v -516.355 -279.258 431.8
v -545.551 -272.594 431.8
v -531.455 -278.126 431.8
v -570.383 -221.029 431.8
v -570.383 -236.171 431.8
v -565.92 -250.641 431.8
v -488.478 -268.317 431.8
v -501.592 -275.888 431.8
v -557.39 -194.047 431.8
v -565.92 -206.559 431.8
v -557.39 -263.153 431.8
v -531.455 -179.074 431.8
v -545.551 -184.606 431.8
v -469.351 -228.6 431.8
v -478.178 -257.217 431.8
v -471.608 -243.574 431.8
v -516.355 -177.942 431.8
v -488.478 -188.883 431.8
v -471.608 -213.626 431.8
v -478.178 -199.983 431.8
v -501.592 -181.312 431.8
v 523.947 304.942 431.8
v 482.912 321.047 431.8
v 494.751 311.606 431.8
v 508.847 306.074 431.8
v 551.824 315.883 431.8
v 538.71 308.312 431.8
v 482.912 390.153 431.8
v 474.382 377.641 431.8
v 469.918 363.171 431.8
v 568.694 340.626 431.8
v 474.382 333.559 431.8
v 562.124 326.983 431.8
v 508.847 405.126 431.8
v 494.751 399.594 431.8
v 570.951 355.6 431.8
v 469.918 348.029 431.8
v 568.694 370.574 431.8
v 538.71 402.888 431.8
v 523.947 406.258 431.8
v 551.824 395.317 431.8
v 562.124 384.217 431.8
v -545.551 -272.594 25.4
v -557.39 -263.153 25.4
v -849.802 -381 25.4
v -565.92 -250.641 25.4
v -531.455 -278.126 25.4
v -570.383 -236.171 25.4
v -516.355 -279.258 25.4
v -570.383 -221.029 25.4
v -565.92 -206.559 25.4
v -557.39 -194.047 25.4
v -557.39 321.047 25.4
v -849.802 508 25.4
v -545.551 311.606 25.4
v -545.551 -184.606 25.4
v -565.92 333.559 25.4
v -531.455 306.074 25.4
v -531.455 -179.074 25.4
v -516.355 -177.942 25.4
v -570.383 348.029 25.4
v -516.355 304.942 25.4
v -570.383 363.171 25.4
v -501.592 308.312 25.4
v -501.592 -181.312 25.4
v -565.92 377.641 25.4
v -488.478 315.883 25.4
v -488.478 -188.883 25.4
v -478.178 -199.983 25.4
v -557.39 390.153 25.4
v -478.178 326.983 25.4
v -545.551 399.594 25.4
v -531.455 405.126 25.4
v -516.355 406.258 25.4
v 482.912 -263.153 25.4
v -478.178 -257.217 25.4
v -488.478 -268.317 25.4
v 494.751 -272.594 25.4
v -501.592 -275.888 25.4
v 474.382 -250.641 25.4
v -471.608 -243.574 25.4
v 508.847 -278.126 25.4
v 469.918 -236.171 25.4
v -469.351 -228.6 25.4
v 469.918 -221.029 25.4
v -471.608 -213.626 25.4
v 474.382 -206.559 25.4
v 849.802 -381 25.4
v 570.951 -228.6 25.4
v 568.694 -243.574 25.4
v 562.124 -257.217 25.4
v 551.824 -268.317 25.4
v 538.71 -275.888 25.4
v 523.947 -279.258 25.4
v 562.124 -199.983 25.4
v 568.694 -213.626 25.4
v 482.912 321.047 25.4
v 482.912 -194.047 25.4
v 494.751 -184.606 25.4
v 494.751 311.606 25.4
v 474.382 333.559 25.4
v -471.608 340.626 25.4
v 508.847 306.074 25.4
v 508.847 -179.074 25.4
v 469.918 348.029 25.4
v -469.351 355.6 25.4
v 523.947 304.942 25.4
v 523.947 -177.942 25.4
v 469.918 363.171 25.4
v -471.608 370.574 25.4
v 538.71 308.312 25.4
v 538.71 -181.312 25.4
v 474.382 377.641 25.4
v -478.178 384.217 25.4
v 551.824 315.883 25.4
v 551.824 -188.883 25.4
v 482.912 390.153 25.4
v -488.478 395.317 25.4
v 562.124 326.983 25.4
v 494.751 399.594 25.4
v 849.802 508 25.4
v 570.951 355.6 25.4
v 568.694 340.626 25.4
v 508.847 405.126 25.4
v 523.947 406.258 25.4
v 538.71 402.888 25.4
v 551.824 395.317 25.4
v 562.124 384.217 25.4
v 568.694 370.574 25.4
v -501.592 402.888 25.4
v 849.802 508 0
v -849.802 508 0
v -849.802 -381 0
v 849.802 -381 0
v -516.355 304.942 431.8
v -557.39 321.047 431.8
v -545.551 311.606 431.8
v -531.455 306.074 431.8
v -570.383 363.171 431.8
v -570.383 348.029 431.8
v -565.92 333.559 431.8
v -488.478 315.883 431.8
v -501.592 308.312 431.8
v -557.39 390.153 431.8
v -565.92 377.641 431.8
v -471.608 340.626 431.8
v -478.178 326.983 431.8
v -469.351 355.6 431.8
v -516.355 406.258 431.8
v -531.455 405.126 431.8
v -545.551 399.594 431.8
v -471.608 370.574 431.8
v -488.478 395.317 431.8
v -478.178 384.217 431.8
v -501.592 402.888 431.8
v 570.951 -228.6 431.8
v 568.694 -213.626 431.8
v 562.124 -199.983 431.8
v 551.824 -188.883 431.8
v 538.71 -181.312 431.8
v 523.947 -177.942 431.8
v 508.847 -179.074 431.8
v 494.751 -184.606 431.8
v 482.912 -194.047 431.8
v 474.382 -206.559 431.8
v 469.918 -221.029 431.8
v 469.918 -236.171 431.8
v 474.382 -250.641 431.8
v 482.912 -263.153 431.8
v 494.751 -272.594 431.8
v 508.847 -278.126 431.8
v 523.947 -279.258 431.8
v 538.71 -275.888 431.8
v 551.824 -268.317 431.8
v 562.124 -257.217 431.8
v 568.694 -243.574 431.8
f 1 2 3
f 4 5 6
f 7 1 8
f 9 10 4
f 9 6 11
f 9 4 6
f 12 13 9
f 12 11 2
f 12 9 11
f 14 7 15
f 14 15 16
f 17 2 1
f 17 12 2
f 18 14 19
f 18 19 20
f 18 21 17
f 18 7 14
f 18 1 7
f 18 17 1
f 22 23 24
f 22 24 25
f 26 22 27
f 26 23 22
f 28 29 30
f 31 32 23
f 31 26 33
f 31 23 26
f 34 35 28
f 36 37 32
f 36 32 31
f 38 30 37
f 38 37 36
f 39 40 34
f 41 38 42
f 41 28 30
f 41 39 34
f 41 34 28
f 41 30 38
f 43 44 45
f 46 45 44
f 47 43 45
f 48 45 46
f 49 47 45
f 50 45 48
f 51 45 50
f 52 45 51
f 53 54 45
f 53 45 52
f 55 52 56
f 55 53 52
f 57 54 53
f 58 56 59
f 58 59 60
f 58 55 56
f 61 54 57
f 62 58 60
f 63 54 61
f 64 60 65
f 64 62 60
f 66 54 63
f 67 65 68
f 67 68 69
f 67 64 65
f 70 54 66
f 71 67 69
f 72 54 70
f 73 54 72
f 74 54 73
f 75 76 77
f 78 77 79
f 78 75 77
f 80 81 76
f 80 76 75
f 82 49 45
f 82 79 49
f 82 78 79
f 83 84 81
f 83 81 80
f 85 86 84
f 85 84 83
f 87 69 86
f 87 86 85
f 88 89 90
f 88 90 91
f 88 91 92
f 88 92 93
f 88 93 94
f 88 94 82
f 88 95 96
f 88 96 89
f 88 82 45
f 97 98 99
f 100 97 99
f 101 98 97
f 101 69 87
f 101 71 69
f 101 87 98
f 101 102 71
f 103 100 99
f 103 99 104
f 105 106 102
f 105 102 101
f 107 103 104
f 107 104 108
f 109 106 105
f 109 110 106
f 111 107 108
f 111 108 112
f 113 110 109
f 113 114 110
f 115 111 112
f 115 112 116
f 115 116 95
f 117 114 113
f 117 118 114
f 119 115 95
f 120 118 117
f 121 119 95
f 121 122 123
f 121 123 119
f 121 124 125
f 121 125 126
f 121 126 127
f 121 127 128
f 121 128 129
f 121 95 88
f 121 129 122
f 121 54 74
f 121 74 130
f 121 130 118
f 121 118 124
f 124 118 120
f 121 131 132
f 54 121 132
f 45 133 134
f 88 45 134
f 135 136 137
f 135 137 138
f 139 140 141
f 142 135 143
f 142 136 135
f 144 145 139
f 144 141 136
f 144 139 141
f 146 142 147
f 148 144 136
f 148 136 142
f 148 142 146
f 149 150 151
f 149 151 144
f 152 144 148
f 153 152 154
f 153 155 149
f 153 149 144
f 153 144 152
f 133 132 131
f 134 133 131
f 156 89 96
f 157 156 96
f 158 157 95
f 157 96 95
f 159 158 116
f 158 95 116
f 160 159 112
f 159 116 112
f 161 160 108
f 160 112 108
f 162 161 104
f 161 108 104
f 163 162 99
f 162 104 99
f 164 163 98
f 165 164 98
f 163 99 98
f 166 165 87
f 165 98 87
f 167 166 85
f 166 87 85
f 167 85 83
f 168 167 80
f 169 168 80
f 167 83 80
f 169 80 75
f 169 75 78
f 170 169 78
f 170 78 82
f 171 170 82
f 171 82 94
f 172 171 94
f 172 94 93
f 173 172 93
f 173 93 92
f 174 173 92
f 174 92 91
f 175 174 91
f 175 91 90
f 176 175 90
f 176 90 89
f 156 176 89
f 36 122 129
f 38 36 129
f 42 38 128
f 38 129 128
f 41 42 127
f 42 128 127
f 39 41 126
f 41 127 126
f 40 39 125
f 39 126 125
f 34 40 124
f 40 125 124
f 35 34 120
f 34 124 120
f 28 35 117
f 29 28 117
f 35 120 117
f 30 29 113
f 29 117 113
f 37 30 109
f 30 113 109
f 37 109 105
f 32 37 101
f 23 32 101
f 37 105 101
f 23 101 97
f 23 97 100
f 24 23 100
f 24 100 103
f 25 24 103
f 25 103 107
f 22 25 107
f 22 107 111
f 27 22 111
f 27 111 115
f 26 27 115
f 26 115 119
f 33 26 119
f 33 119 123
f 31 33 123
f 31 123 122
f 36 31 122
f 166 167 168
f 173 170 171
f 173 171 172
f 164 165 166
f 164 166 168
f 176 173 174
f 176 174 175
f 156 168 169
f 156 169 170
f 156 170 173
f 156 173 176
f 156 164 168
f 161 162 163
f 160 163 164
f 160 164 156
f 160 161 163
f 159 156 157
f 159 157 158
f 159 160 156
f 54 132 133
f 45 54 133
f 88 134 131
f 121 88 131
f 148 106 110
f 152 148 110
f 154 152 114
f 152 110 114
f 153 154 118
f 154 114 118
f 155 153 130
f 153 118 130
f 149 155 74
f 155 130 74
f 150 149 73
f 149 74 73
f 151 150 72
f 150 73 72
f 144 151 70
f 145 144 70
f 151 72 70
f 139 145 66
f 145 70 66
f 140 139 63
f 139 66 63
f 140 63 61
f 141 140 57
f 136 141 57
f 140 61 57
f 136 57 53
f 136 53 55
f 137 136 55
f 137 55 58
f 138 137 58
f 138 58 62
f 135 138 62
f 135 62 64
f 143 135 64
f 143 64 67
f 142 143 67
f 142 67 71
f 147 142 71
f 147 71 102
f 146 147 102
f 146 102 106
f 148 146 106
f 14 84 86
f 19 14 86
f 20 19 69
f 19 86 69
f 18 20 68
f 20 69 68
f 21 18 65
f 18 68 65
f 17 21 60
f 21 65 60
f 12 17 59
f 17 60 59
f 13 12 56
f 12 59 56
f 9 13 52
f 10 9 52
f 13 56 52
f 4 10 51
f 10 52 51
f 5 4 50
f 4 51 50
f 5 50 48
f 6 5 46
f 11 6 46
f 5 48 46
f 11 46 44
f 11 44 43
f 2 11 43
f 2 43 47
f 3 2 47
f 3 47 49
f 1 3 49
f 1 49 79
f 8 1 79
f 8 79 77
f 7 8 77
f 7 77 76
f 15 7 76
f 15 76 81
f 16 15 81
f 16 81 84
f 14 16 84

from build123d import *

# Parameters (mm, degrees)
F0_R     = 50.8
F0_W     = 25.4
F0_H     = 127
F1_DEPTH = 25.4
F2_DEPTH = 431.8


with BuildPart() as f1:
    # F0 (on Top) → F1 (new body)
    with BuildSketch(Plane.XY):
        Polygon((-190.5, 508), (-190.5, 381), (-12.7, 381), (12.7, 381), (190.5, 381), (190.5, 508), align=None)
        Polygon((190.5, 381), (12.7, 381), (12.7, 254), (12.7, 127), (12.7, 0), (12.7, -127), (12.7, -254), (12.7, -381), (190.5, -381), align=None)
        Polygon((849.801779, 508), (190.5, 508), (190.5, 381), (190.5, -381), (849.801779, -381), align=None)
        with Locations((520.150889, -228.6)):
            Circle(F0_R, mode=Mode.SUBTRACT)
        with Locations((520.150889, 355.6)):
            Circle(F0_R, mode=Mode.SUBTRACT)
        with Locations((520.150889, 355.6)):
            Circle(F0_R)
        with Locations((520.150889, -228.6)):
            Circle(F0_R)
        Polygon((-12.7, 381), (-190.5, 381), (-190.5, -381), (-12.7, -381), (-12.7, -254), (-12.7, -127), (-12.7, 0), (-12.7, 127), (-12.7, 254), align=None)
        Polygon((-190.5, -381), (-190.5, 381), (-190.5, 508), (-849.801779, 508), (-849.801779, -381), align=None)
        with Locations((-520.150889, -228.6)):
            Circle(F0_R, mode=Mode.SUBTRACT)
        with Locations((-520.150889, 355.6)):
            Circle(F0_R, mode=Mode.SUBTRACT)
        with Locations((-520.150889, 355.6)):
            Circle(F0_R)
        with Locations((-520.150889, -228.6)):
            Circle(F0_R)
        with Locations((0, -317.5)):
            Rectangle(F0_W, F0_H)
        with Locations((0, -190.5)):
            Rectangle(F0_W, F0_H)
        with Locations((0, -63.5)):
            Rectangle(F0_W, F0_H)
        with Locations((0, 63.5)):
            Rectangle(F0_W, F0_H)
        with Locations((0, 317.5)):
            Rectangle(F0_W, F0_H)
        with Locations((0, 190.5)):
            Rectangle(F0_W, F0_H)
    extrude(amount=F1_DEPTH)

    # F0 (on Top) → F2 (join)
    with BuildSketch(Plane.XY):
        with Locations((-520.150889, 355.6)):
            Circle(F0_R)
        with Locations((520.150889, 355.6)):
            Circle(F0_R)
        with Locations((520.150889, -228.6)):
            Circle(F0_R)
        with Locations((-520.150889, -228.6)):
            Circle(F0_R)
    extrude(amount=F2_DEPTH)


solid = f1.part
